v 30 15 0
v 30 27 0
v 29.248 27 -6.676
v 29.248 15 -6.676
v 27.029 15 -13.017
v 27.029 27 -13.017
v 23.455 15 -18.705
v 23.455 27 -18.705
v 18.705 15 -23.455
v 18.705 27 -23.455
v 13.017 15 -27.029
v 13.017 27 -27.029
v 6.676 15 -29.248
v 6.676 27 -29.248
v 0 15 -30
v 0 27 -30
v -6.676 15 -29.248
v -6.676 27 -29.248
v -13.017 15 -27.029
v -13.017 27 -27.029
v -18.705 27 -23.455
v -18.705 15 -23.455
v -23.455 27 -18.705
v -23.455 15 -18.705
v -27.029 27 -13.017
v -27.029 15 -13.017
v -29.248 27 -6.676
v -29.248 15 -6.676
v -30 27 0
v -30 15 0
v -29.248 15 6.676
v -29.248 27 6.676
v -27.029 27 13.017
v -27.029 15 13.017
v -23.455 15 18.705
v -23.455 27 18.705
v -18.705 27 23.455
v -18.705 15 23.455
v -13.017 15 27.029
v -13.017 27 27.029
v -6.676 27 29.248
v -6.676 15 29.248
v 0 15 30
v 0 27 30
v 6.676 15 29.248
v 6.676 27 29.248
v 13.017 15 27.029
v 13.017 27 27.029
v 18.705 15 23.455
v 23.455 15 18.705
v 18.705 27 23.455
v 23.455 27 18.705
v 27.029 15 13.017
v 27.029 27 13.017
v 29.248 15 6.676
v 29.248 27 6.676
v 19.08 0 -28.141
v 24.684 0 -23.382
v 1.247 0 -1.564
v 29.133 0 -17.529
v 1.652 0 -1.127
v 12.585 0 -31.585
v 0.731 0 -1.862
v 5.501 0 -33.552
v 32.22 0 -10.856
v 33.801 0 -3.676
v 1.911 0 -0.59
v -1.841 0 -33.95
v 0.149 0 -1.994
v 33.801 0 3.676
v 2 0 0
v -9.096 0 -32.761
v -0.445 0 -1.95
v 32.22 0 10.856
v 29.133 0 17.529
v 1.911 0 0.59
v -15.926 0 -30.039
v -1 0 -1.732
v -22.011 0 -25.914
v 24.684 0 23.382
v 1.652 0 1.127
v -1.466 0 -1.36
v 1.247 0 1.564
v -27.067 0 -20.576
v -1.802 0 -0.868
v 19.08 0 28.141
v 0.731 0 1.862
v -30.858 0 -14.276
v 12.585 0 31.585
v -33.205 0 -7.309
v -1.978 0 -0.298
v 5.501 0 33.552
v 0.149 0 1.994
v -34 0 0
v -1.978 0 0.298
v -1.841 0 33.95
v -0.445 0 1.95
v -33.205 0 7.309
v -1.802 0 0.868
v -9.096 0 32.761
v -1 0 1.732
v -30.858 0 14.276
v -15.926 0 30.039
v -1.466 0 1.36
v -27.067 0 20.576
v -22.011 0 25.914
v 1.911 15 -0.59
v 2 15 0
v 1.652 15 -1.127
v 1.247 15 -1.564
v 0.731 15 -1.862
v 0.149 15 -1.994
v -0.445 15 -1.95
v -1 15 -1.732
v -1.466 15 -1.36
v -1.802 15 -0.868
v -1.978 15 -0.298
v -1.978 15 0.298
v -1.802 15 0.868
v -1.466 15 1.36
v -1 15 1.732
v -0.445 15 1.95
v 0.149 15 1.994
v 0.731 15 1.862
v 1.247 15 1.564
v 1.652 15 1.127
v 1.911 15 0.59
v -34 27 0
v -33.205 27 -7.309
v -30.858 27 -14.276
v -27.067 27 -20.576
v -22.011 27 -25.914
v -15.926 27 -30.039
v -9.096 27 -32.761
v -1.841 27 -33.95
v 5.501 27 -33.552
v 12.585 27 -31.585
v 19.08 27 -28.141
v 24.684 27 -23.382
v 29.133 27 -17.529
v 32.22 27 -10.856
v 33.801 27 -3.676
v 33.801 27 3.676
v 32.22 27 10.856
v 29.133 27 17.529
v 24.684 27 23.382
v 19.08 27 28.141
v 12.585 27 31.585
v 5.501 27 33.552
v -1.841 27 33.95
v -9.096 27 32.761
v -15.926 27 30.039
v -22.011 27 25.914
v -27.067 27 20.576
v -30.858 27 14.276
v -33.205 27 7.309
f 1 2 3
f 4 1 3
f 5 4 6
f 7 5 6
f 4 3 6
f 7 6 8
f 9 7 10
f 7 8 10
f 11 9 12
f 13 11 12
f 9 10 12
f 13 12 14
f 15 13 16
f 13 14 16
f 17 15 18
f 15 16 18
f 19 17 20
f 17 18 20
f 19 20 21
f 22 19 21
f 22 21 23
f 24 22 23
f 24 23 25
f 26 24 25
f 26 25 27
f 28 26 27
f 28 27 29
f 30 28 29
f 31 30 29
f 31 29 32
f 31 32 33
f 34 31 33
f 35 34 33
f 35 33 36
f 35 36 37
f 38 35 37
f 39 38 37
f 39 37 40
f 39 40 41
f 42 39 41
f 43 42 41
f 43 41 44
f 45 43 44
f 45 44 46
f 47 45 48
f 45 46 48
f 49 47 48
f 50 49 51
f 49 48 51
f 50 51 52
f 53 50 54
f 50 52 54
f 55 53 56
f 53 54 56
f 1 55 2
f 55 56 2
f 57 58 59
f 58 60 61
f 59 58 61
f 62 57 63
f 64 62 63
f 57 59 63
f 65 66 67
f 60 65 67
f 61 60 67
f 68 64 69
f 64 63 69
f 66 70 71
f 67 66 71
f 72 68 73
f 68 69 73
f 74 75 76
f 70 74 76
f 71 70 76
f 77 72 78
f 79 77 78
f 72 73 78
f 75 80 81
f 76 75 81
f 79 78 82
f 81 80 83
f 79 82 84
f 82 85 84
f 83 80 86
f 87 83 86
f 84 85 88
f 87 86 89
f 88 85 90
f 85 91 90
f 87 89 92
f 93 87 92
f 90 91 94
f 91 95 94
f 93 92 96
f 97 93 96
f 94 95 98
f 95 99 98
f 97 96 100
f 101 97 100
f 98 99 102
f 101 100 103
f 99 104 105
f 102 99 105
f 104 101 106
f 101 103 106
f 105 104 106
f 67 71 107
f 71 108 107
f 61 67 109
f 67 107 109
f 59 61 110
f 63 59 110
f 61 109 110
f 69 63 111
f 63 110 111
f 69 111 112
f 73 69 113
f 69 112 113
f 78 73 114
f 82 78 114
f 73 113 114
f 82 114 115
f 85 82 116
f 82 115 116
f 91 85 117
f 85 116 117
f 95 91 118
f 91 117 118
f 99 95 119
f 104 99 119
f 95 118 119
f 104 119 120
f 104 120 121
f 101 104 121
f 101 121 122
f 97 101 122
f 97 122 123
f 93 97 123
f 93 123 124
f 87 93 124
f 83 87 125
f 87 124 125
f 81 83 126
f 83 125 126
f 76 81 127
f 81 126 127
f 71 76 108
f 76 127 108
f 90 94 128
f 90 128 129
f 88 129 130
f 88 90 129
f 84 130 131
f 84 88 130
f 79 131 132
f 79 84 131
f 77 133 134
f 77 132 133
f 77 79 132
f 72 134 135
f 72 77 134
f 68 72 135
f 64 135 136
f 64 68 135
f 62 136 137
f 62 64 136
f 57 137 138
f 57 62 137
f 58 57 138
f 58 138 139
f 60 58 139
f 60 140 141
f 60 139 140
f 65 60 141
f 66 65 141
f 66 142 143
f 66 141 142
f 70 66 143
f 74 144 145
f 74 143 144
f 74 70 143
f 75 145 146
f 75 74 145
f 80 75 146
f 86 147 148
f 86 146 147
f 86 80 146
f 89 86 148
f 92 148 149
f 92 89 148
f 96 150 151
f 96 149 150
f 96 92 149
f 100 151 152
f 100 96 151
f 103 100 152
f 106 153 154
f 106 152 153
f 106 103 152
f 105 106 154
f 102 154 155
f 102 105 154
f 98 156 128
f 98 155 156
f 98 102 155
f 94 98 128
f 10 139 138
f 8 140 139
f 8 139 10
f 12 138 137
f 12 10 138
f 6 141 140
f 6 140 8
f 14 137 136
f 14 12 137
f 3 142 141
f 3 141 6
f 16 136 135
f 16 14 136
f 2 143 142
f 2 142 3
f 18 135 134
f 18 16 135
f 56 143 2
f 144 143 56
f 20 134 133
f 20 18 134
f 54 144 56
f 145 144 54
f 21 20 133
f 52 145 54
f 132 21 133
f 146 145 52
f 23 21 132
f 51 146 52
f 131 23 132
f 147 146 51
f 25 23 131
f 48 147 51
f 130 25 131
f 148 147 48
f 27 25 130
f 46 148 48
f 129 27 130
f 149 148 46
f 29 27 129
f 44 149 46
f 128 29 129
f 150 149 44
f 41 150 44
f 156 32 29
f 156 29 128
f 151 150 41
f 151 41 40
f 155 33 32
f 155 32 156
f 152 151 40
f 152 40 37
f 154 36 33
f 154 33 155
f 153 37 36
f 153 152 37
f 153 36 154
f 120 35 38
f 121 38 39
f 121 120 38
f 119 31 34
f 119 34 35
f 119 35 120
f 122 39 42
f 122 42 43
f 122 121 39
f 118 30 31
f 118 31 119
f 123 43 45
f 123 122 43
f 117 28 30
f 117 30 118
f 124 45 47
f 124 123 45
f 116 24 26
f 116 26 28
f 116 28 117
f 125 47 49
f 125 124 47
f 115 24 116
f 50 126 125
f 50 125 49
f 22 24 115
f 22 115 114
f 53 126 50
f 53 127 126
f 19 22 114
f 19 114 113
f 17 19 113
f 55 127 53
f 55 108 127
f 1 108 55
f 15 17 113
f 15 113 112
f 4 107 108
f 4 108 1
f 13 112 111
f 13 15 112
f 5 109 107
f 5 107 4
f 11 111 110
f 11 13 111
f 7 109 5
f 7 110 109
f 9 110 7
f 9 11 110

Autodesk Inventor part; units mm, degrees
ref_plane "YZ Plane" through (0, 0, 0) normal (1, 0, 0) x (0, 1, 0)
ref_plane "XZ Plane" through (0, 0, 0) normal (0, 1, 0) x (-1, 0, 0)
ref_plane "XY Plane" through (0, 0, 0) normal (0, 0, 1) x (1, 0, 0)
sketch "Sketch1" plane through (0, 0, 0) normal (0, 1, 0) x (-1, 0, 0)
  circle A0 centre (0, 0) radius 34
  dimension "d0" = 68
extrude "Extrusion1" add sketch "Sketch1" along normal blind 27
sketch "Sketch2" plane through (0, 27, 0) normal (0, 1, 0) x (1, 0, 0)
  circle A0 centre (0, 0) radius 30
  dimension "d3" = 60
extrude "Extrusion2" cut sketch "Sketch2" against normal blind 12
sketch "Sketch5" plane through (0, 15, 0) normal (0, 1, 0) x (1, 0, 0)
  circle A0 centre (0, 0) radius 2
  dimension "d13" = 4
extrude "Extrusion5" cut sketch "Sketch5" against normal through all
properties part number "Wheel"
